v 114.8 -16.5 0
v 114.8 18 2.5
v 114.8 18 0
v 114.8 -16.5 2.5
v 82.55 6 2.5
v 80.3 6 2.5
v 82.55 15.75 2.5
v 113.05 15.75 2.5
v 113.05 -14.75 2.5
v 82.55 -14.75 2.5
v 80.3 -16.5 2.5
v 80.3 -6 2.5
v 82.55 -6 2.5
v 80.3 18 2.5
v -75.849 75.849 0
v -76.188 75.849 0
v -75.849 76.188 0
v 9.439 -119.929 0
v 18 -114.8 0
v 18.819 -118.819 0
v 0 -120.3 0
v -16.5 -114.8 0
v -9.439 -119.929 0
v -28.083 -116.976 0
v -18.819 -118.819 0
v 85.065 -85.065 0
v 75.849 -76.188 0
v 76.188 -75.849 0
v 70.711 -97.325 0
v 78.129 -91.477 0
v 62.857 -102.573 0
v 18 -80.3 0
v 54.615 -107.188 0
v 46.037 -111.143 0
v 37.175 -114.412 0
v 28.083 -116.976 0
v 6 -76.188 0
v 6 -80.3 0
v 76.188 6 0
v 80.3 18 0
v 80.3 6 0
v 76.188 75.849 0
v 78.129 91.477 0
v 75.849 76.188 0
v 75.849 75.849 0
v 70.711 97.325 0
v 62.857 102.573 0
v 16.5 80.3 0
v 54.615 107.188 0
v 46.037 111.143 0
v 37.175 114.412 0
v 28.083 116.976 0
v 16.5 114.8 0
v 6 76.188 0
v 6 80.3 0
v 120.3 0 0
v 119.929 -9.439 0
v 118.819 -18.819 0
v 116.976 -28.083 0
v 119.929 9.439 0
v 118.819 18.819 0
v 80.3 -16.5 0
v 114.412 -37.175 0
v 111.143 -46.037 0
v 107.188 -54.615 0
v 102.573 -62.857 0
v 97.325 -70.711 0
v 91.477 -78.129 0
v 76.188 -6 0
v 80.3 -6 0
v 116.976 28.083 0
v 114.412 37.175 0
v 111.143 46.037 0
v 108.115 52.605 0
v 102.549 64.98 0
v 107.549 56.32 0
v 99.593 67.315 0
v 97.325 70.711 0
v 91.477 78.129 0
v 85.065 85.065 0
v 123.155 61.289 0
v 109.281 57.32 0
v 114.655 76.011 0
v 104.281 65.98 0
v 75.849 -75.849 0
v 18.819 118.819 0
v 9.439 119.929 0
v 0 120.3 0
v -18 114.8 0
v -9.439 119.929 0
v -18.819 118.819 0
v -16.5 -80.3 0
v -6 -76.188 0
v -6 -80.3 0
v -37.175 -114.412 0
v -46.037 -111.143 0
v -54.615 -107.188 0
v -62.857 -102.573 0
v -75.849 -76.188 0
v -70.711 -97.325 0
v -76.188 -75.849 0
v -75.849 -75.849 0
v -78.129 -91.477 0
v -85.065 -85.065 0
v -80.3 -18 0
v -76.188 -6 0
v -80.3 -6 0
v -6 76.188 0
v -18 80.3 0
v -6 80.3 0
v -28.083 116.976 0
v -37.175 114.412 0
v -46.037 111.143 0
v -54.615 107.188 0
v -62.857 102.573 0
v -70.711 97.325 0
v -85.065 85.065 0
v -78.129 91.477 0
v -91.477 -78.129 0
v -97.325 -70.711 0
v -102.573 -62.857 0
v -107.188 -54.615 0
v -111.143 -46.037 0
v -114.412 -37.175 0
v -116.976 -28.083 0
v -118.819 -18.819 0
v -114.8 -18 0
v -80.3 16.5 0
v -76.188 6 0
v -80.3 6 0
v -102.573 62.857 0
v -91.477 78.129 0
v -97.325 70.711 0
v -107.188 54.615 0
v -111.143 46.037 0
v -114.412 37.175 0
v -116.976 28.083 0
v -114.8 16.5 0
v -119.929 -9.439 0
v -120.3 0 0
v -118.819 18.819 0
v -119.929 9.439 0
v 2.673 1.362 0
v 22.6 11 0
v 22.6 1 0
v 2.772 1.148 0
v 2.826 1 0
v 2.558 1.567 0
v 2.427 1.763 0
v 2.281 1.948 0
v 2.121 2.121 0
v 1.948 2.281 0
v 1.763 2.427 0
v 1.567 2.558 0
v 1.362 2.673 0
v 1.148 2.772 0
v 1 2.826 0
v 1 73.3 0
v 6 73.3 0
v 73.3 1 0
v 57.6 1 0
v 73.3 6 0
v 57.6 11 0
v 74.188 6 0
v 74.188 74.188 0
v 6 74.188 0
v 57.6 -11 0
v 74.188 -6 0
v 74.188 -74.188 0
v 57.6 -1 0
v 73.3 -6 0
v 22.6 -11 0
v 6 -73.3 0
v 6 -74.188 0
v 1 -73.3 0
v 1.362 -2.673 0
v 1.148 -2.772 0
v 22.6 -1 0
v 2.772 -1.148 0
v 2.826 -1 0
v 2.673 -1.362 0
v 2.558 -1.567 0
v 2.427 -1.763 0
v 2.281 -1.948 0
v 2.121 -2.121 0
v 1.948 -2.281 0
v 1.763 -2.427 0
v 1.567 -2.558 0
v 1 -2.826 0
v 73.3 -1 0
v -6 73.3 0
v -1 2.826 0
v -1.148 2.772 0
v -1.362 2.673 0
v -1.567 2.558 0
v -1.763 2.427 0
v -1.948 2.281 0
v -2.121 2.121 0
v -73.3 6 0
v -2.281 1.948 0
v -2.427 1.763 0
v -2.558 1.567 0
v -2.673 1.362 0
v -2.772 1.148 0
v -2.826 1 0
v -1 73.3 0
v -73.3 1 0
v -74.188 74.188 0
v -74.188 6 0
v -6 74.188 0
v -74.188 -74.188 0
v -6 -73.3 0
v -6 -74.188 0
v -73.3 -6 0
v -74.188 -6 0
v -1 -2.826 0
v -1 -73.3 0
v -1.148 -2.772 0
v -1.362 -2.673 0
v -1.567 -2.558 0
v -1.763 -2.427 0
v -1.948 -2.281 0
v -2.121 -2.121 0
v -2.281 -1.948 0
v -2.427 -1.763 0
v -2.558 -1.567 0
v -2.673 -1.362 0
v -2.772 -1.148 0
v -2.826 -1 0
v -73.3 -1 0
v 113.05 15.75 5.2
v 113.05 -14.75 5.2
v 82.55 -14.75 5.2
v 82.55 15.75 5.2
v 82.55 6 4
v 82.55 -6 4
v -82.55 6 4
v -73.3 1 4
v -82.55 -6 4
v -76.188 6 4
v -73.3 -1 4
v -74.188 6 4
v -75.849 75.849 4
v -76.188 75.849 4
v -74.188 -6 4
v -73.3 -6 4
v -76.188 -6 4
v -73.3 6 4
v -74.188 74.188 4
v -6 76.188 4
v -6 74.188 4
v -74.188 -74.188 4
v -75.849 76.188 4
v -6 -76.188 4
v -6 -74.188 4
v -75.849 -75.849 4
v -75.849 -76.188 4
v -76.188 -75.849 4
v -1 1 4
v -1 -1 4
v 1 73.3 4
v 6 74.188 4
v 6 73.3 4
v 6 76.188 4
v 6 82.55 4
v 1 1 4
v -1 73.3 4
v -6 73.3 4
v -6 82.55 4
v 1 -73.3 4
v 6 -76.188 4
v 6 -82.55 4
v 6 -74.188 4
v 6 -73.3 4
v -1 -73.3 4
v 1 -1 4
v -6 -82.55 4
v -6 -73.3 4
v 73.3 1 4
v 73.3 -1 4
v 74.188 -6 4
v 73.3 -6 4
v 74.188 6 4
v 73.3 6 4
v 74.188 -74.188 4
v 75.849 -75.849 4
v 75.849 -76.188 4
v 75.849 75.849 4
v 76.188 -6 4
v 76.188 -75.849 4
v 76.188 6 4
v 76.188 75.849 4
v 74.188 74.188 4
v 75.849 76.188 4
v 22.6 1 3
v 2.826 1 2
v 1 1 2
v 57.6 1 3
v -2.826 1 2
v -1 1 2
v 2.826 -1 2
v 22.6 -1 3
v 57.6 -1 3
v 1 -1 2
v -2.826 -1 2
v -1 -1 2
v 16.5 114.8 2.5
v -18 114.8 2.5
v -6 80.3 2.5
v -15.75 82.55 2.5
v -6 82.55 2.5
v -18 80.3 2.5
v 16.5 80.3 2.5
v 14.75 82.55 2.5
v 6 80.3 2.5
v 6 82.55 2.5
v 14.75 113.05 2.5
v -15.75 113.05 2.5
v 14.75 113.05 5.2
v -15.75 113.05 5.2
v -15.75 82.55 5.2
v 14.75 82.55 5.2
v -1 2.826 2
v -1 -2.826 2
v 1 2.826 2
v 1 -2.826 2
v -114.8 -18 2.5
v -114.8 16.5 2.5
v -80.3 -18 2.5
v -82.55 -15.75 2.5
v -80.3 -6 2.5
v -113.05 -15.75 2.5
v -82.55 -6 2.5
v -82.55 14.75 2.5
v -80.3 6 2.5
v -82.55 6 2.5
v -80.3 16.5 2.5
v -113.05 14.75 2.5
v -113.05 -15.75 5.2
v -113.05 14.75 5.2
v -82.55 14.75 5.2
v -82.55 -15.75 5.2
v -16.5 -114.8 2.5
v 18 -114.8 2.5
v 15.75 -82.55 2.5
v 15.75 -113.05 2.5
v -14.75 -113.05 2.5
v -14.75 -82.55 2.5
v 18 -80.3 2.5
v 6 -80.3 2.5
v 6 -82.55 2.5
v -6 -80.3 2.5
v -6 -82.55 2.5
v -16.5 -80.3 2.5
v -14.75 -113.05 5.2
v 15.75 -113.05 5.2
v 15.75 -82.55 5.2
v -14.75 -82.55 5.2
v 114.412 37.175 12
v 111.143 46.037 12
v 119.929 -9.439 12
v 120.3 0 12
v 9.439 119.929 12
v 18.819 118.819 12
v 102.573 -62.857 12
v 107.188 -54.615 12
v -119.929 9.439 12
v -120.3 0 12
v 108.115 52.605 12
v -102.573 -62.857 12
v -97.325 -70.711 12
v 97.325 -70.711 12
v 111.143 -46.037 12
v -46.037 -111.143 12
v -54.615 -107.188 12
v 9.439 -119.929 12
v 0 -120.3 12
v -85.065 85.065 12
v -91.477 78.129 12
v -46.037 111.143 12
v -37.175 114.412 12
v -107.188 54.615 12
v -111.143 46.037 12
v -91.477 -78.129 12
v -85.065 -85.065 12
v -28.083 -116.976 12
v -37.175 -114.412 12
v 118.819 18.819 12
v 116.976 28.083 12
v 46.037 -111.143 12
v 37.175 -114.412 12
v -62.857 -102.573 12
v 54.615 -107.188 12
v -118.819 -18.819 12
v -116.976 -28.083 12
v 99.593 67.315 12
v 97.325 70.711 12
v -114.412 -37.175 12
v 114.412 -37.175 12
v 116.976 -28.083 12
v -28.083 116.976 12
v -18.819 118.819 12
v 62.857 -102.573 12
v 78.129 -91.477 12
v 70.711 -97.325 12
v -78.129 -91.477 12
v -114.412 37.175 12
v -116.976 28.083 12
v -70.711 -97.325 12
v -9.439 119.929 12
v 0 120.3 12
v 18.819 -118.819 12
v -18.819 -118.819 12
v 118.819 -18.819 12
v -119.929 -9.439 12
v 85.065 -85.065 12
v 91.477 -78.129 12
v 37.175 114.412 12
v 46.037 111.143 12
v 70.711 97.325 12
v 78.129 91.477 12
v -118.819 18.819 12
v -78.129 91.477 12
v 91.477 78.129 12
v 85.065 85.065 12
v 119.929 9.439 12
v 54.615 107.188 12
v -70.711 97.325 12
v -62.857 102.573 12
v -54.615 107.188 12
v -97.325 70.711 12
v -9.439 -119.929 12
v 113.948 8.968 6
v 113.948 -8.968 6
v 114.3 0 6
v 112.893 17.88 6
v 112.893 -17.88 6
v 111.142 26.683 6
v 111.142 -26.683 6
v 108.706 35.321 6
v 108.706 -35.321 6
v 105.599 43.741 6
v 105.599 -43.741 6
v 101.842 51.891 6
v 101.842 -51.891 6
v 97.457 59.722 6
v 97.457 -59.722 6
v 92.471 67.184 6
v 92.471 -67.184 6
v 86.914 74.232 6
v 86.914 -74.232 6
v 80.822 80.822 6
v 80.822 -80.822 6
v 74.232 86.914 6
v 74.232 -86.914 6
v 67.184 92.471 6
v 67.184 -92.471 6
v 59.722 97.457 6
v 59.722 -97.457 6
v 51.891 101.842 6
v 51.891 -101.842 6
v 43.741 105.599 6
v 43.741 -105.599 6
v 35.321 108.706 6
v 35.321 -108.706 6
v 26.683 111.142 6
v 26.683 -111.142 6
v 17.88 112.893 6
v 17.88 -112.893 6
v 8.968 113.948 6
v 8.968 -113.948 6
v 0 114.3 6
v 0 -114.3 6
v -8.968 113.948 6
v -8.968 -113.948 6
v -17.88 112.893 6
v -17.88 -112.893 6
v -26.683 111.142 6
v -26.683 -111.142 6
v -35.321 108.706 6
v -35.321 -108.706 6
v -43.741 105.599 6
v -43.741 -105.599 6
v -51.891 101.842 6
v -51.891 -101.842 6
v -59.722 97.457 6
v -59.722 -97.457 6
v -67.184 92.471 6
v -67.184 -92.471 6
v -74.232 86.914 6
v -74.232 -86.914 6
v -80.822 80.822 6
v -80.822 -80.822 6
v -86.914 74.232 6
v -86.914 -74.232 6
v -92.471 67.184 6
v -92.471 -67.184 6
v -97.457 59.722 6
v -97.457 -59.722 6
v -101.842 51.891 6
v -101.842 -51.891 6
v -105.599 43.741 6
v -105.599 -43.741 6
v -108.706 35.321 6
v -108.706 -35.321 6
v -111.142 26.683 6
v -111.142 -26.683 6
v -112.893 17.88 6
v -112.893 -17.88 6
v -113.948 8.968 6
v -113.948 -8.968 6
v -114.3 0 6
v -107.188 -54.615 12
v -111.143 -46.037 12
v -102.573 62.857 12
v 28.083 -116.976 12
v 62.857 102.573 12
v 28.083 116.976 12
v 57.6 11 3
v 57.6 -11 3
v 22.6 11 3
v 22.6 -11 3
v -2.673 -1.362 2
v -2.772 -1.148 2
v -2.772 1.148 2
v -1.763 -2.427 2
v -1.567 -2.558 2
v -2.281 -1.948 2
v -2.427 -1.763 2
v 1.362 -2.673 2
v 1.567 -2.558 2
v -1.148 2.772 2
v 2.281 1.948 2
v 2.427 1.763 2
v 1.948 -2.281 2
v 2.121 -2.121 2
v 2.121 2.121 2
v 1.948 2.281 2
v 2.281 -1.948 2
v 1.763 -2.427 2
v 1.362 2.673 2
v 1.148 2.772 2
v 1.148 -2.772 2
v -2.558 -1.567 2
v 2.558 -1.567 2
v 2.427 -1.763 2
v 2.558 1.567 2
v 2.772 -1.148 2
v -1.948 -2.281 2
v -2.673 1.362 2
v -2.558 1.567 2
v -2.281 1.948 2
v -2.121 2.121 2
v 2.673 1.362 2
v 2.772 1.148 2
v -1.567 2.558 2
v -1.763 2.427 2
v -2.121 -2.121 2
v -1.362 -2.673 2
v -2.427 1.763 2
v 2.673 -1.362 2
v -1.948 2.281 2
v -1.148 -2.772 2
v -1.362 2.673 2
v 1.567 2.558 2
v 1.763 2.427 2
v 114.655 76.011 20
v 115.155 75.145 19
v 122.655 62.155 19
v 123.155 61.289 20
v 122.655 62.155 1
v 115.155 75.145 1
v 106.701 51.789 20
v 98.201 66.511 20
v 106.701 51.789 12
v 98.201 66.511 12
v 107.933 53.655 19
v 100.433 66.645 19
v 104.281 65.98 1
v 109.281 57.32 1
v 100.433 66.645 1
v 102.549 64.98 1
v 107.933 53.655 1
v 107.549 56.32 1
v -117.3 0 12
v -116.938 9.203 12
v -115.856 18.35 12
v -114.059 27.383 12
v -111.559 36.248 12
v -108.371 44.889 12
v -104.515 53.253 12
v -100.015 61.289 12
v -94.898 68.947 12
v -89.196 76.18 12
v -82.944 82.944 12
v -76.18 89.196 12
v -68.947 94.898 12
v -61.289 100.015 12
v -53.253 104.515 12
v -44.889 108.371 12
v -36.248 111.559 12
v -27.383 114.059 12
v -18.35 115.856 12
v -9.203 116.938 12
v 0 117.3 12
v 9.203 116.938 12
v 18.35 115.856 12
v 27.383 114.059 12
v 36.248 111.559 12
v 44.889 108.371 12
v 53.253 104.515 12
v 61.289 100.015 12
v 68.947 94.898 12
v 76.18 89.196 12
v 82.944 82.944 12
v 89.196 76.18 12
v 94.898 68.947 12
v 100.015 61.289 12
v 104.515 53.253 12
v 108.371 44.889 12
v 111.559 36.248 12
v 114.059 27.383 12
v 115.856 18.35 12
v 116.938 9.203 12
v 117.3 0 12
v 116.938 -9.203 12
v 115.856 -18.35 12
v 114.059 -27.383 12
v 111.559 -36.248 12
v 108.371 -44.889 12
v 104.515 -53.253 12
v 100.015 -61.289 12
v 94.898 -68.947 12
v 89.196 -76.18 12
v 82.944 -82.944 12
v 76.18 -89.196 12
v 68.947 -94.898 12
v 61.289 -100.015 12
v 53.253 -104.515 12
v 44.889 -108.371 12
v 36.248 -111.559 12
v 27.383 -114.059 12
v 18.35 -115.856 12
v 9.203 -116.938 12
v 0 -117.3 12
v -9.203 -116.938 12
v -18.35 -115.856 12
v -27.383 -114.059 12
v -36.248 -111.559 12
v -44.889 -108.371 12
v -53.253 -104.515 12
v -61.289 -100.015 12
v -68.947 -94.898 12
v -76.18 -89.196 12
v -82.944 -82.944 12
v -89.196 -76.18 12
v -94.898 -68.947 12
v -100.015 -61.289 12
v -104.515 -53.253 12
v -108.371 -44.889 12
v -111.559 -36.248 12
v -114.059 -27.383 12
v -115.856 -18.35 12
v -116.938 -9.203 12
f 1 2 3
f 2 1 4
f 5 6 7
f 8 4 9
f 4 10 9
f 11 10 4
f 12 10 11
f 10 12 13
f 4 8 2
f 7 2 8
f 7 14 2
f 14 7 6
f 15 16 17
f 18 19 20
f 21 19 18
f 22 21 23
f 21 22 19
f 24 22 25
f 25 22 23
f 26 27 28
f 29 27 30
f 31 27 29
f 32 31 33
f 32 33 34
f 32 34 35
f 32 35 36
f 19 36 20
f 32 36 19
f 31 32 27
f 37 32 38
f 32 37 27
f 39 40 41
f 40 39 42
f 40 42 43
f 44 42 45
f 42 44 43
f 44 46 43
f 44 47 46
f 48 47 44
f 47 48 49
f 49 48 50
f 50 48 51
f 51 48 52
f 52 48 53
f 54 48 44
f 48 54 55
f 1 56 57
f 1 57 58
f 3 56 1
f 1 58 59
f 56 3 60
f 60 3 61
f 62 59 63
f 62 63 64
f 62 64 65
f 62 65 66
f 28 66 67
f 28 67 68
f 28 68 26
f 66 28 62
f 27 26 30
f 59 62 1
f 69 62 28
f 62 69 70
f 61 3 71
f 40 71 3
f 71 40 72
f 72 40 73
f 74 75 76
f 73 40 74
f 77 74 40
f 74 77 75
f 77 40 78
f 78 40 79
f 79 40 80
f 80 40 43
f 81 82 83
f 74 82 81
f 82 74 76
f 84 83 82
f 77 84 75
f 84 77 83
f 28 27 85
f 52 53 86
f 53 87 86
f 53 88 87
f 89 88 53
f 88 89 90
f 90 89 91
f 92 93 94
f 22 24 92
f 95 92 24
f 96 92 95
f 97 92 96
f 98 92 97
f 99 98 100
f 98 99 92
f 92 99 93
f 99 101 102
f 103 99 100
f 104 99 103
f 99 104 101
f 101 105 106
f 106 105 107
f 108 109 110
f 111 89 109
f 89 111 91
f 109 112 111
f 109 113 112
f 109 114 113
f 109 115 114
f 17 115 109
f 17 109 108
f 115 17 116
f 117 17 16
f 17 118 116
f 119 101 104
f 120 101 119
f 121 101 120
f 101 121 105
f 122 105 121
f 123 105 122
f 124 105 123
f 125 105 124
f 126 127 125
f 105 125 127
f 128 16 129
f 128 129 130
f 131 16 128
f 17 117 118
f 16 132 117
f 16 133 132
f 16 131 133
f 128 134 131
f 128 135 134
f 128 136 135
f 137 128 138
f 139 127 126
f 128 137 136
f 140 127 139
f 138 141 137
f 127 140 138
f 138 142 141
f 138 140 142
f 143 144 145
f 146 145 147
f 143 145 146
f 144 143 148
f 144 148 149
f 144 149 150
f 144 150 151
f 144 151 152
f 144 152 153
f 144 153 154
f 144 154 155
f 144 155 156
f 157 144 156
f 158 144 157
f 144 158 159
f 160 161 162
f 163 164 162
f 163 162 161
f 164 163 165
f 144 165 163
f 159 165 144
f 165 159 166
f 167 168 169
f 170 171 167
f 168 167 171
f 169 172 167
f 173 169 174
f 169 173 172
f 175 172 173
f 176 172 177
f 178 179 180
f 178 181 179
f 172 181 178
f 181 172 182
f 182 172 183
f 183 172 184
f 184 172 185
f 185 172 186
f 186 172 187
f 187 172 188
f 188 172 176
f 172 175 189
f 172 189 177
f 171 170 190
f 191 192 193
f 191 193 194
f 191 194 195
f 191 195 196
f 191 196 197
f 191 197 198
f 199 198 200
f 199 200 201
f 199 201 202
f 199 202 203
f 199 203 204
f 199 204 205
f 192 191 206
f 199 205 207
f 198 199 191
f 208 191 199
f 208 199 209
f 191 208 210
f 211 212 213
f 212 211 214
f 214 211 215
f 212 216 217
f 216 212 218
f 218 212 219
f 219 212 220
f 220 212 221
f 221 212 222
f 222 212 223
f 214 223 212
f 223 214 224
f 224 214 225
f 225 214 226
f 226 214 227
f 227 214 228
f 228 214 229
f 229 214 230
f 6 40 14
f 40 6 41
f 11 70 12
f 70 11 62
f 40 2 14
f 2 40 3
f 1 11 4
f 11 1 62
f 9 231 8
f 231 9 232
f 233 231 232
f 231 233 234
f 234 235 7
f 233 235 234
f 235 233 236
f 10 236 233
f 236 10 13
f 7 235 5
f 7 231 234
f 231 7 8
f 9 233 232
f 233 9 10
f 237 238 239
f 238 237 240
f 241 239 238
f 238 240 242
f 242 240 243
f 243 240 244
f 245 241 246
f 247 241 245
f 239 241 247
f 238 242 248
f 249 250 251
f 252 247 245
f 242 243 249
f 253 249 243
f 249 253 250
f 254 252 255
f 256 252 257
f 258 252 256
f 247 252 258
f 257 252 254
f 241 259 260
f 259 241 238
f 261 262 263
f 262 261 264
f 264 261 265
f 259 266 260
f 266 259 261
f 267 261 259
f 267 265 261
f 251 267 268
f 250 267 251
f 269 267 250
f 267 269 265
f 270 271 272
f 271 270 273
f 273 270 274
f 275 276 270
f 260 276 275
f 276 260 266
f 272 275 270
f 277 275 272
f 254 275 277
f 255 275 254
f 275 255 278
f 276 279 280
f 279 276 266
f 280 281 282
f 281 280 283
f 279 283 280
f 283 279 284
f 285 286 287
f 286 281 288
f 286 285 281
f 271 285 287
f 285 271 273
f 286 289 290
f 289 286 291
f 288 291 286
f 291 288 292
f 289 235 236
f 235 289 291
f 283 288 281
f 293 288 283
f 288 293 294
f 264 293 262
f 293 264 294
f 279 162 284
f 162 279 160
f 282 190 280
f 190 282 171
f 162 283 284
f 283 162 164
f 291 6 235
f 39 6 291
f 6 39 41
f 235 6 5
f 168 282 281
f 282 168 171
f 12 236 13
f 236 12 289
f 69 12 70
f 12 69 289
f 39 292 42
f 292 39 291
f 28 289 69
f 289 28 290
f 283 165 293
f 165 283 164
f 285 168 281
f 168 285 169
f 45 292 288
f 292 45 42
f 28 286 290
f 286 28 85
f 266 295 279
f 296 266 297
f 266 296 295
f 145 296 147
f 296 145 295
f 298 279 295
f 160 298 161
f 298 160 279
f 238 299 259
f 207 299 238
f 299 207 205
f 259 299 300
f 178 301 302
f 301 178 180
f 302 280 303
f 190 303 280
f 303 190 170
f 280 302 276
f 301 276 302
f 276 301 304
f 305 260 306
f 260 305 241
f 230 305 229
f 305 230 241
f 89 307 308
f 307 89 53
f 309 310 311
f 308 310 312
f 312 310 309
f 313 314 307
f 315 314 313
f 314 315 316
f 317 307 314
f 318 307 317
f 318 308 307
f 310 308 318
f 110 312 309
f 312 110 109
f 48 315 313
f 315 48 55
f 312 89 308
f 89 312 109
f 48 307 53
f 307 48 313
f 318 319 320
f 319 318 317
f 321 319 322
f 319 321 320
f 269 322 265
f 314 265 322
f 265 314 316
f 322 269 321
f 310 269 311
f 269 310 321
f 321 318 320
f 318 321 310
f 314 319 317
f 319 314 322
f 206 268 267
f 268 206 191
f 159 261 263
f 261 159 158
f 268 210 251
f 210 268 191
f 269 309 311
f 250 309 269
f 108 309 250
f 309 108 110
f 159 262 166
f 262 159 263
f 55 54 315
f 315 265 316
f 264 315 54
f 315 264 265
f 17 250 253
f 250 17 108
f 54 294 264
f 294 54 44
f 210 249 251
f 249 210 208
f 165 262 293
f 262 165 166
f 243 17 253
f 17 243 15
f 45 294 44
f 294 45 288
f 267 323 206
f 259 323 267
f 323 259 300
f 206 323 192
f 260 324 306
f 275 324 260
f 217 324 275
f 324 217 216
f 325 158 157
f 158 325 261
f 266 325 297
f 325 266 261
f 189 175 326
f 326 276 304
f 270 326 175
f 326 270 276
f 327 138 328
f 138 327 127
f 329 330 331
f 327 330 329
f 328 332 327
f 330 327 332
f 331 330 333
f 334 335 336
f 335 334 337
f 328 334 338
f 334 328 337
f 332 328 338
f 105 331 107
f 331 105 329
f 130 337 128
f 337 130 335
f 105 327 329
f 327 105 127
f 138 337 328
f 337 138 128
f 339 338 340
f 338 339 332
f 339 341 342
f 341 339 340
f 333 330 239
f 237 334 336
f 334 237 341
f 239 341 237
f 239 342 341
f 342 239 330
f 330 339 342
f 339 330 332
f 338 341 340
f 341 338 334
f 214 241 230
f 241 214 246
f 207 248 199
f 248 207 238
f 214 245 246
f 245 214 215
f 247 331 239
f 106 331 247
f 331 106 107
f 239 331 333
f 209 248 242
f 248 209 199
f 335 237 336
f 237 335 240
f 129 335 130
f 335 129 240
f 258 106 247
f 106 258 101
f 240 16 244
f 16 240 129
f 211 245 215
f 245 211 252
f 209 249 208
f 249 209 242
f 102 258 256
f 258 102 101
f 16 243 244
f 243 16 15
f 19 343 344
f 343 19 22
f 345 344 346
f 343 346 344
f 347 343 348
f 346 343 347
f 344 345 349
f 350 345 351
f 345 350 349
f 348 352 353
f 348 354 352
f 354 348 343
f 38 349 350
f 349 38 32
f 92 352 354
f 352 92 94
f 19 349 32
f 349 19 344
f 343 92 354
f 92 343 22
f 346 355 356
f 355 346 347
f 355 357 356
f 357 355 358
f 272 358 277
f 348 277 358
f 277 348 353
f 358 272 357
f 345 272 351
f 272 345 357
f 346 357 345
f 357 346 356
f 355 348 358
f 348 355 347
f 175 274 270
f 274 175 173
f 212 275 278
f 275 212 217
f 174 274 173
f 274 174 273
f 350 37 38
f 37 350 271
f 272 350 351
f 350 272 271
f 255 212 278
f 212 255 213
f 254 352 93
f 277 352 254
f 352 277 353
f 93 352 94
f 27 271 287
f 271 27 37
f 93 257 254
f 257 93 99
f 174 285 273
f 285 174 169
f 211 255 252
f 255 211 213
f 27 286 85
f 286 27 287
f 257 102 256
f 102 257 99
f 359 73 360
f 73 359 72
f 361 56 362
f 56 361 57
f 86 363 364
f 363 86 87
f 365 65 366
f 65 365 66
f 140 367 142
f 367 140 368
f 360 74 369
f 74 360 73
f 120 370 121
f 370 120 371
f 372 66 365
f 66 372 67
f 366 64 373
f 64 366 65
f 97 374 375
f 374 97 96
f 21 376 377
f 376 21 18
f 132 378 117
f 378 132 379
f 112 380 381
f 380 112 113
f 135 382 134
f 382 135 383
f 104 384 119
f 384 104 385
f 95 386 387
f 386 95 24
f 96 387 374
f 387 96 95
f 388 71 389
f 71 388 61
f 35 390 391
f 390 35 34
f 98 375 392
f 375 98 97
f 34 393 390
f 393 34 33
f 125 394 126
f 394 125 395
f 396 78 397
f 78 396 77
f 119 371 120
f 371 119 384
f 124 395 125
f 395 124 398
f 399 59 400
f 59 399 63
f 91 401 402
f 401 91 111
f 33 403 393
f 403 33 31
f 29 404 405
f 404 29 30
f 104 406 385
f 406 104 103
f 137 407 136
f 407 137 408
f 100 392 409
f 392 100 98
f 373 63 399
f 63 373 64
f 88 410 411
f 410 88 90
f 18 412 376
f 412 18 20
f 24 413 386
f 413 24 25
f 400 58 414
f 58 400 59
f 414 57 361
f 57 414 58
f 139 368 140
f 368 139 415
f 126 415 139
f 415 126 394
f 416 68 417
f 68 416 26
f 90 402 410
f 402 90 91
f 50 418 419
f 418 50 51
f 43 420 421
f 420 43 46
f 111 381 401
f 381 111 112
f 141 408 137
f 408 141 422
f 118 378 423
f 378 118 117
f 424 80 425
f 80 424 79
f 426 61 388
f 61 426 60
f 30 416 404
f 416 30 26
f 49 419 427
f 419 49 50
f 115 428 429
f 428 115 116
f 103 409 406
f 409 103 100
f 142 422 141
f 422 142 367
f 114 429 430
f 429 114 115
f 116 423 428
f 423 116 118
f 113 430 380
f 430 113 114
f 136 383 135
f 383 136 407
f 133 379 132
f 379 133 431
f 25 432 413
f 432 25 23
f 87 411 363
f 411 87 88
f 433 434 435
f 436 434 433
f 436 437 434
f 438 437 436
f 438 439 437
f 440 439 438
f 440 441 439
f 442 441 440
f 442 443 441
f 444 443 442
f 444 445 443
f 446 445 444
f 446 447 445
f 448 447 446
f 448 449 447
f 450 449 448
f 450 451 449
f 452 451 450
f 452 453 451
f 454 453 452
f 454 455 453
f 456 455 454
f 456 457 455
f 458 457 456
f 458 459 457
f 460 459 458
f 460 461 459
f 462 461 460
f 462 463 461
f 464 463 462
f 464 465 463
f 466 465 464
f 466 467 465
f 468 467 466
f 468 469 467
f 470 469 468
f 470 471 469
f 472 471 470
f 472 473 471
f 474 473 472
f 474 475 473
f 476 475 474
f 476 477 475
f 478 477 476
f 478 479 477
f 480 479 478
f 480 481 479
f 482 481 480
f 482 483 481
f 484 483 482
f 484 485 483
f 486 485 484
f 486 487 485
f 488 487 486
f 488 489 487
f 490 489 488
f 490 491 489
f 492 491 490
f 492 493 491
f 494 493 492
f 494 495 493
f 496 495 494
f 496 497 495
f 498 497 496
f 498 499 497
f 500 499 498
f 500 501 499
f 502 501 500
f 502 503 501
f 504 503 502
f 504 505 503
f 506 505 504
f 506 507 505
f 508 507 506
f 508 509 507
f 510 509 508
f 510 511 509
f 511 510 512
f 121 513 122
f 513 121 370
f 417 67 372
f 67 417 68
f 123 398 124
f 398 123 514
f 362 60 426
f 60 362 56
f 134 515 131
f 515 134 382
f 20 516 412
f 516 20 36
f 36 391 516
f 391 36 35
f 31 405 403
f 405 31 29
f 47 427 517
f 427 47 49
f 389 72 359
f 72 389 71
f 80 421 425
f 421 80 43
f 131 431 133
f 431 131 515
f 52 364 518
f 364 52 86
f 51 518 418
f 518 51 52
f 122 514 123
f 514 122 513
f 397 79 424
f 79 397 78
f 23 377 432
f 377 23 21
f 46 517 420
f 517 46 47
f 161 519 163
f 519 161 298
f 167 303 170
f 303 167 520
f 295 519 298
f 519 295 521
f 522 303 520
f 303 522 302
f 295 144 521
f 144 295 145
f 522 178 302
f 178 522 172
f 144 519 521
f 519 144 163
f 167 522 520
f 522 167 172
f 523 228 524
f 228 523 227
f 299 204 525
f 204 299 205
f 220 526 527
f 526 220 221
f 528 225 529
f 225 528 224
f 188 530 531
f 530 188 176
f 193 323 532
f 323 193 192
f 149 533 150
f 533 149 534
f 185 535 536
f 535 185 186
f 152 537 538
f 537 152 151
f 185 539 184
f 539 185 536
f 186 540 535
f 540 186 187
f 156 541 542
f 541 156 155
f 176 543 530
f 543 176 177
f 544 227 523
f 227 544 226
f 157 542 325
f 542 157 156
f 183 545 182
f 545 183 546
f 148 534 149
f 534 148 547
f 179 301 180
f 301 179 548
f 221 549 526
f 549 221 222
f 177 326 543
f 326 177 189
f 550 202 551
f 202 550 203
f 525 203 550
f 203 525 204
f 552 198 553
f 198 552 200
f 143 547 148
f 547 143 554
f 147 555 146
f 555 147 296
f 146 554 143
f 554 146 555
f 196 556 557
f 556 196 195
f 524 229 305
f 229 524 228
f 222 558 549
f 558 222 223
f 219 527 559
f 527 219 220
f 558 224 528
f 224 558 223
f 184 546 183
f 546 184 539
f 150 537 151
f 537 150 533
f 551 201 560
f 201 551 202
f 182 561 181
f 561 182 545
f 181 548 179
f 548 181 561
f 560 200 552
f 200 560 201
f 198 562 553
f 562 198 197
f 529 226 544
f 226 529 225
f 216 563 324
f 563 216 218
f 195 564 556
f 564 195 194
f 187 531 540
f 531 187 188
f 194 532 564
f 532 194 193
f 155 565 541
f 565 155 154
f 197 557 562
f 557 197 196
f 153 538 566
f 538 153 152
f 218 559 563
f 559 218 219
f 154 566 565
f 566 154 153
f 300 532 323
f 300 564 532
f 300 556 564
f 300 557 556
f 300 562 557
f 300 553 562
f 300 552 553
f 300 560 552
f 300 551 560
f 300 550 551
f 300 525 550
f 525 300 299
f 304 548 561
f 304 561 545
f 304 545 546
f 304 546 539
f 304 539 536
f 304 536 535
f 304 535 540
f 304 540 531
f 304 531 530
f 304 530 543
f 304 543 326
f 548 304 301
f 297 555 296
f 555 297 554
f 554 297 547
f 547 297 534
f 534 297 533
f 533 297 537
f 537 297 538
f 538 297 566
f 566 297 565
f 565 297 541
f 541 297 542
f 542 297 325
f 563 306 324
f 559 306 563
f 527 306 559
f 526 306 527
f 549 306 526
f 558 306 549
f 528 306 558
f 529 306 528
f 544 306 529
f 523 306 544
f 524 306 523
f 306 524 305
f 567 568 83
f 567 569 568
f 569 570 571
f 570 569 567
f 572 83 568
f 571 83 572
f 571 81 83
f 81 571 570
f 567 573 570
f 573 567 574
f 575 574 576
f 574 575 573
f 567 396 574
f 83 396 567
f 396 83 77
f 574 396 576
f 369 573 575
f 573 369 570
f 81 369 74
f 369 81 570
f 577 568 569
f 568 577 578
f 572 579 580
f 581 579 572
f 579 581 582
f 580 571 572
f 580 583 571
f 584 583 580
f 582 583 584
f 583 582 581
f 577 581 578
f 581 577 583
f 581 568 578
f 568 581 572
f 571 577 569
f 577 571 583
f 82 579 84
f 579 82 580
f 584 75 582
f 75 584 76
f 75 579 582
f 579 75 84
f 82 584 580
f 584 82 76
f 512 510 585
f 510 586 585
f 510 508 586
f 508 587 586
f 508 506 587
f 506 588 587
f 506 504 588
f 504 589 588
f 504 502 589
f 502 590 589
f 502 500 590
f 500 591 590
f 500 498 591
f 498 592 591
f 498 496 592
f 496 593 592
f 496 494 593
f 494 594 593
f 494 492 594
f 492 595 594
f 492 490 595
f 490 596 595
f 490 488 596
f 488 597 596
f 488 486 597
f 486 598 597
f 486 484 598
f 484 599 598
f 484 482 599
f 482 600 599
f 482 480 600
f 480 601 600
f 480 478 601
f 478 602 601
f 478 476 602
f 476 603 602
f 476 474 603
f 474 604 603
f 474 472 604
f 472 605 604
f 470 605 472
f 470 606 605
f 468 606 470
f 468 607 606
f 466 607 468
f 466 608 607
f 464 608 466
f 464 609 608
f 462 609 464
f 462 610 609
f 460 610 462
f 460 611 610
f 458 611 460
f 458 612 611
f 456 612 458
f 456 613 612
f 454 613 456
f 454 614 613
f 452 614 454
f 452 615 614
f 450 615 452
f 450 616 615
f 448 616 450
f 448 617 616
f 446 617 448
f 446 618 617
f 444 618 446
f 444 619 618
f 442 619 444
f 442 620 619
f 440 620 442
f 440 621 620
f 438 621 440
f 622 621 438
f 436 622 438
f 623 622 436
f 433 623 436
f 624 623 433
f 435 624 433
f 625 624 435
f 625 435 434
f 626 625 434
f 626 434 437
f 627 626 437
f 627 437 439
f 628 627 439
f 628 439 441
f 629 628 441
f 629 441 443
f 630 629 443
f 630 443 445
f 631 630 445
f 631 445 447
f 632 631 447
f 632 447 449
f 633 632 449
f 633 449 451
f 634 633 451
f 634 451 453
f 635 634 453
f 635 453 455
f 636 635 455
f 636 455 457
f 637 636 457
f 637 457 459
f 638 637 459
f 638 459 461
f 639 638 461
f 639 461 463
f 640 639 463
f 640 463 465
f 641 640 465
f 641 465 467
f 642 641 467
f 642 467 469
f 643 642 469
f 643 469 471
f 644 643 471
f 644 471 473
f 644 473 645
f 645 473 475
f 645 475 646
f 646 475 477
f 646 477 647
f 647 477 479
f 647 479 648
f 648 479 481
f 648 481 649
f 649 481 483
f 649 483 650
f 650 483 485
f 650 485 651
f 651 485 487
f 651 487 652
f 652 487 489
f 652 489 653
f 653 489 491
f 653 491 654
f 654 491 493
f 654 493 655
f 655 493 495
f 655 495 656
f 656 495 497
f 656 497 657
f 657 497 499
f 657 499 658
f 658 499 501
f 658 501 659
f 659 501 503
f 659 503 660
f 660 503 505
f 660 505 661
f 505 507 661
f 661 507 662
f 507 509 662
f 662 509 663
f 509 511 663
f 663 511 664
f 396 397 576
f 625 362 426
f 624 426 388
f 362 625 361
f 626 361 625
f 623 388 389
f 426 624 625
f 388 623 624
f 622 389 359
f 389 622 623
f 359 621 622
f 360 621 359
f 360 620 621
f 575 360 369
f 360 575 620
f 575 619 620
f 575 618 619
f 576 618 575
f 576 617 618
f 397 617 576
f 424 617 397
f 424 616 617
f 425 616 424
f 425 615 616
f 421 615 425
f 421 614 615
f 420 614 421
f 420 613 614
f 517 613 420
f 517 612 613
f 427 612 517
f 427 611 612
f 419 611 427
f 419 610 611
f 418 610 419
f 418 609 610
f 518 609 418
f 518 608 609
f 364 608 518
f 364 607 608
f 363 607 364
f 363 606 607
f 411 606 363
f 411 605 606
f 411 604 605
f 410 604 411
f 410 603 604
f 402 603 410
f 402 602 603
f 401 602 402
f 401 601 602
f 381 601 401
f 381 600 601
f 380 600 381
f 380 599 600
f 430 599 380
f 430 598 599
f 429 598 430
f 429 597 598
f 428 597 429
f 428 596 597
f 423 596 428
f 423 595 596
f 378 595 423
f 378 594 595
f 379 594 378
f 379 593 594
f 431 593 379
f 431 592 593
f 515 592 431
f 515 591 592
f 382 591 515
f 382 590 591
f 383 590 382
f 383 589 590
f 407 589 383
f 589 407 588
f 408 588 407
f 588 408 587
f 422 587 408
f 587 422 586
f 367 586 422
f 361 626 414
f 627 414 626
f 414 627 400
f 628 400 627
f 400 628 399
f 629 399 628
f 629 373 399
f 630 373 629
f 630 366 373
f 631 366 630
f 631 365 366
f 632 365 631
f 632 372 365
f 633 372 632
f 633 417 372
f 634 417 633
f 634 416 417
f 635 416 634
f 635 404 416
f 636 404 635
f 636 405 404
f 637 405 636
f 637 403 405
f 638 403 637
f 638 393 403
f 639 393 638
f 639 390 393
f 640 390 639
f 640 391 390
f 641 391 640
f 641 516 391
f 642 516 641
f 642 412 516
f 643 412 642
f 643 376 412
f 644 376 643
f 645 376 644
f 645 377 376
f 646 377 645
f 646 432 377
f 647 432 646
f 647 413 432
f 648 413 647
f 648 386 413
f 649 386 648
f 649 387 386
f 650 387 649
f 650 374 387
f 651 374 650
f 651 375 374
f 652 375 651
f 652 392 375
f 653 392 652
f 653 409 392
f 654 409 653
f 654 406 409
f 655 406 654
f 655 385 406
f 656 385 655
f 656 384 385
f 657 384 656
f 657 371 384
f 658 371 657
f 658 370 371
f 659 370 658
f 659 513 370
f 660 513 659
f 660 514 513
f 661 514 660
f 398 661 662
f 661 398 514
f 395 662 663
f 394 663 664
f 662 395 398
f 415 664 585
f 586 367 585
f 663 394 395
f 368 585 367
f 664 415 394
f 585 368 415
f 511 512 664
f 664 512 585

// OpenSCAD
// Mark IV beer scale
// Designed by Greg
// Redesigned by Jon


$fn=80;


// inside diameter
din = 9;

// wall thickness

wall = 6;


// size calculations
dout = din;

d = dout * 25.4 + 2*wall;
r = d / 2;

// thickness

h = 6;

// tolerance on inset for HX-711

tol = 1;

difference(){

    // base circle
    
    linear_extrude(h){
        circle(d = d);
     }
    
    // cutouts for load cells
    
    for (angle = [0, 90, 180, 270]){
        rotate([0, 0, angle]) {
            
            // seat for big c
            translate([r - 40, -16.5, 0])
                cube([34.5, 34.5, 2.5]);
         
            // cutout for inner piece to move
            translate([r - 37.75, -14.75, 0])
                cube([30.5, 30.5, 5.2]);
            
            // outlet for cables
            translate([r-40, 0, 0])
                cube([14, 12, 8], center = true);
            
            // connection channel for cables
            translate([5*r/8, 0, 0])
                cube([2, 1.261 * r, 8], center = true);
            
            //channels to center
            translate([0, -1, 0])
                cube([r - 10, 2, 4]);
        }
    }

    
    // cutout for HX-711
    translate([r/3, 0, 0])
    cube([34 + tol, 21 + tol, 6], center = true);
    
    // central coutout junction
    
    linear_extrude(2)
        circle(3);
    

}

// rim

union(){

rotate_extrude(){
translate([r-wall, h, 0])
polygon(points=[[0,0],[wall,0],[wall,6],[wall/2,6]]);
//square([wall,10]);

}

//rotate([0, 0, -35])
//translate([0, 0, h+8])
//    linear_extrude(2.5)
//        revolve_text(r-wall+.1, chars);
}


// RJ-11 connector

rotate([0,0,30])
    difference() {  
        translate([r-2, -17/2, h-h])
            cube([19, 17, 20]);  // Larger cube
        translate([r, -15/2, h+1-h])
            cube([20, 15, 18]); // Smaller cube (cutout)
        translate([r+2, 0, h-h])
            cube([2, 10, 5], center=true);
        }


radius = 50;
chars = "Mark III ";

module revolve_text(radius, chars) {
    PI = 3.14159;
    circumference = 2 * PI * radius;
    chars_len = len(chars);
    font_size = 4;
    step_angle = 20 / chars_len;
    for(i = [0 : chars_len - 1]) {
        rotate(-i * step_angle) 
            translate([0, radius + font_size / 2, 0]) 
                text(
                    chars[i], 
                    font = "Courier New; Style = Bold", 
                    size = font_size, 
                    valign = "center", halign = "center"
                );
    }
}
